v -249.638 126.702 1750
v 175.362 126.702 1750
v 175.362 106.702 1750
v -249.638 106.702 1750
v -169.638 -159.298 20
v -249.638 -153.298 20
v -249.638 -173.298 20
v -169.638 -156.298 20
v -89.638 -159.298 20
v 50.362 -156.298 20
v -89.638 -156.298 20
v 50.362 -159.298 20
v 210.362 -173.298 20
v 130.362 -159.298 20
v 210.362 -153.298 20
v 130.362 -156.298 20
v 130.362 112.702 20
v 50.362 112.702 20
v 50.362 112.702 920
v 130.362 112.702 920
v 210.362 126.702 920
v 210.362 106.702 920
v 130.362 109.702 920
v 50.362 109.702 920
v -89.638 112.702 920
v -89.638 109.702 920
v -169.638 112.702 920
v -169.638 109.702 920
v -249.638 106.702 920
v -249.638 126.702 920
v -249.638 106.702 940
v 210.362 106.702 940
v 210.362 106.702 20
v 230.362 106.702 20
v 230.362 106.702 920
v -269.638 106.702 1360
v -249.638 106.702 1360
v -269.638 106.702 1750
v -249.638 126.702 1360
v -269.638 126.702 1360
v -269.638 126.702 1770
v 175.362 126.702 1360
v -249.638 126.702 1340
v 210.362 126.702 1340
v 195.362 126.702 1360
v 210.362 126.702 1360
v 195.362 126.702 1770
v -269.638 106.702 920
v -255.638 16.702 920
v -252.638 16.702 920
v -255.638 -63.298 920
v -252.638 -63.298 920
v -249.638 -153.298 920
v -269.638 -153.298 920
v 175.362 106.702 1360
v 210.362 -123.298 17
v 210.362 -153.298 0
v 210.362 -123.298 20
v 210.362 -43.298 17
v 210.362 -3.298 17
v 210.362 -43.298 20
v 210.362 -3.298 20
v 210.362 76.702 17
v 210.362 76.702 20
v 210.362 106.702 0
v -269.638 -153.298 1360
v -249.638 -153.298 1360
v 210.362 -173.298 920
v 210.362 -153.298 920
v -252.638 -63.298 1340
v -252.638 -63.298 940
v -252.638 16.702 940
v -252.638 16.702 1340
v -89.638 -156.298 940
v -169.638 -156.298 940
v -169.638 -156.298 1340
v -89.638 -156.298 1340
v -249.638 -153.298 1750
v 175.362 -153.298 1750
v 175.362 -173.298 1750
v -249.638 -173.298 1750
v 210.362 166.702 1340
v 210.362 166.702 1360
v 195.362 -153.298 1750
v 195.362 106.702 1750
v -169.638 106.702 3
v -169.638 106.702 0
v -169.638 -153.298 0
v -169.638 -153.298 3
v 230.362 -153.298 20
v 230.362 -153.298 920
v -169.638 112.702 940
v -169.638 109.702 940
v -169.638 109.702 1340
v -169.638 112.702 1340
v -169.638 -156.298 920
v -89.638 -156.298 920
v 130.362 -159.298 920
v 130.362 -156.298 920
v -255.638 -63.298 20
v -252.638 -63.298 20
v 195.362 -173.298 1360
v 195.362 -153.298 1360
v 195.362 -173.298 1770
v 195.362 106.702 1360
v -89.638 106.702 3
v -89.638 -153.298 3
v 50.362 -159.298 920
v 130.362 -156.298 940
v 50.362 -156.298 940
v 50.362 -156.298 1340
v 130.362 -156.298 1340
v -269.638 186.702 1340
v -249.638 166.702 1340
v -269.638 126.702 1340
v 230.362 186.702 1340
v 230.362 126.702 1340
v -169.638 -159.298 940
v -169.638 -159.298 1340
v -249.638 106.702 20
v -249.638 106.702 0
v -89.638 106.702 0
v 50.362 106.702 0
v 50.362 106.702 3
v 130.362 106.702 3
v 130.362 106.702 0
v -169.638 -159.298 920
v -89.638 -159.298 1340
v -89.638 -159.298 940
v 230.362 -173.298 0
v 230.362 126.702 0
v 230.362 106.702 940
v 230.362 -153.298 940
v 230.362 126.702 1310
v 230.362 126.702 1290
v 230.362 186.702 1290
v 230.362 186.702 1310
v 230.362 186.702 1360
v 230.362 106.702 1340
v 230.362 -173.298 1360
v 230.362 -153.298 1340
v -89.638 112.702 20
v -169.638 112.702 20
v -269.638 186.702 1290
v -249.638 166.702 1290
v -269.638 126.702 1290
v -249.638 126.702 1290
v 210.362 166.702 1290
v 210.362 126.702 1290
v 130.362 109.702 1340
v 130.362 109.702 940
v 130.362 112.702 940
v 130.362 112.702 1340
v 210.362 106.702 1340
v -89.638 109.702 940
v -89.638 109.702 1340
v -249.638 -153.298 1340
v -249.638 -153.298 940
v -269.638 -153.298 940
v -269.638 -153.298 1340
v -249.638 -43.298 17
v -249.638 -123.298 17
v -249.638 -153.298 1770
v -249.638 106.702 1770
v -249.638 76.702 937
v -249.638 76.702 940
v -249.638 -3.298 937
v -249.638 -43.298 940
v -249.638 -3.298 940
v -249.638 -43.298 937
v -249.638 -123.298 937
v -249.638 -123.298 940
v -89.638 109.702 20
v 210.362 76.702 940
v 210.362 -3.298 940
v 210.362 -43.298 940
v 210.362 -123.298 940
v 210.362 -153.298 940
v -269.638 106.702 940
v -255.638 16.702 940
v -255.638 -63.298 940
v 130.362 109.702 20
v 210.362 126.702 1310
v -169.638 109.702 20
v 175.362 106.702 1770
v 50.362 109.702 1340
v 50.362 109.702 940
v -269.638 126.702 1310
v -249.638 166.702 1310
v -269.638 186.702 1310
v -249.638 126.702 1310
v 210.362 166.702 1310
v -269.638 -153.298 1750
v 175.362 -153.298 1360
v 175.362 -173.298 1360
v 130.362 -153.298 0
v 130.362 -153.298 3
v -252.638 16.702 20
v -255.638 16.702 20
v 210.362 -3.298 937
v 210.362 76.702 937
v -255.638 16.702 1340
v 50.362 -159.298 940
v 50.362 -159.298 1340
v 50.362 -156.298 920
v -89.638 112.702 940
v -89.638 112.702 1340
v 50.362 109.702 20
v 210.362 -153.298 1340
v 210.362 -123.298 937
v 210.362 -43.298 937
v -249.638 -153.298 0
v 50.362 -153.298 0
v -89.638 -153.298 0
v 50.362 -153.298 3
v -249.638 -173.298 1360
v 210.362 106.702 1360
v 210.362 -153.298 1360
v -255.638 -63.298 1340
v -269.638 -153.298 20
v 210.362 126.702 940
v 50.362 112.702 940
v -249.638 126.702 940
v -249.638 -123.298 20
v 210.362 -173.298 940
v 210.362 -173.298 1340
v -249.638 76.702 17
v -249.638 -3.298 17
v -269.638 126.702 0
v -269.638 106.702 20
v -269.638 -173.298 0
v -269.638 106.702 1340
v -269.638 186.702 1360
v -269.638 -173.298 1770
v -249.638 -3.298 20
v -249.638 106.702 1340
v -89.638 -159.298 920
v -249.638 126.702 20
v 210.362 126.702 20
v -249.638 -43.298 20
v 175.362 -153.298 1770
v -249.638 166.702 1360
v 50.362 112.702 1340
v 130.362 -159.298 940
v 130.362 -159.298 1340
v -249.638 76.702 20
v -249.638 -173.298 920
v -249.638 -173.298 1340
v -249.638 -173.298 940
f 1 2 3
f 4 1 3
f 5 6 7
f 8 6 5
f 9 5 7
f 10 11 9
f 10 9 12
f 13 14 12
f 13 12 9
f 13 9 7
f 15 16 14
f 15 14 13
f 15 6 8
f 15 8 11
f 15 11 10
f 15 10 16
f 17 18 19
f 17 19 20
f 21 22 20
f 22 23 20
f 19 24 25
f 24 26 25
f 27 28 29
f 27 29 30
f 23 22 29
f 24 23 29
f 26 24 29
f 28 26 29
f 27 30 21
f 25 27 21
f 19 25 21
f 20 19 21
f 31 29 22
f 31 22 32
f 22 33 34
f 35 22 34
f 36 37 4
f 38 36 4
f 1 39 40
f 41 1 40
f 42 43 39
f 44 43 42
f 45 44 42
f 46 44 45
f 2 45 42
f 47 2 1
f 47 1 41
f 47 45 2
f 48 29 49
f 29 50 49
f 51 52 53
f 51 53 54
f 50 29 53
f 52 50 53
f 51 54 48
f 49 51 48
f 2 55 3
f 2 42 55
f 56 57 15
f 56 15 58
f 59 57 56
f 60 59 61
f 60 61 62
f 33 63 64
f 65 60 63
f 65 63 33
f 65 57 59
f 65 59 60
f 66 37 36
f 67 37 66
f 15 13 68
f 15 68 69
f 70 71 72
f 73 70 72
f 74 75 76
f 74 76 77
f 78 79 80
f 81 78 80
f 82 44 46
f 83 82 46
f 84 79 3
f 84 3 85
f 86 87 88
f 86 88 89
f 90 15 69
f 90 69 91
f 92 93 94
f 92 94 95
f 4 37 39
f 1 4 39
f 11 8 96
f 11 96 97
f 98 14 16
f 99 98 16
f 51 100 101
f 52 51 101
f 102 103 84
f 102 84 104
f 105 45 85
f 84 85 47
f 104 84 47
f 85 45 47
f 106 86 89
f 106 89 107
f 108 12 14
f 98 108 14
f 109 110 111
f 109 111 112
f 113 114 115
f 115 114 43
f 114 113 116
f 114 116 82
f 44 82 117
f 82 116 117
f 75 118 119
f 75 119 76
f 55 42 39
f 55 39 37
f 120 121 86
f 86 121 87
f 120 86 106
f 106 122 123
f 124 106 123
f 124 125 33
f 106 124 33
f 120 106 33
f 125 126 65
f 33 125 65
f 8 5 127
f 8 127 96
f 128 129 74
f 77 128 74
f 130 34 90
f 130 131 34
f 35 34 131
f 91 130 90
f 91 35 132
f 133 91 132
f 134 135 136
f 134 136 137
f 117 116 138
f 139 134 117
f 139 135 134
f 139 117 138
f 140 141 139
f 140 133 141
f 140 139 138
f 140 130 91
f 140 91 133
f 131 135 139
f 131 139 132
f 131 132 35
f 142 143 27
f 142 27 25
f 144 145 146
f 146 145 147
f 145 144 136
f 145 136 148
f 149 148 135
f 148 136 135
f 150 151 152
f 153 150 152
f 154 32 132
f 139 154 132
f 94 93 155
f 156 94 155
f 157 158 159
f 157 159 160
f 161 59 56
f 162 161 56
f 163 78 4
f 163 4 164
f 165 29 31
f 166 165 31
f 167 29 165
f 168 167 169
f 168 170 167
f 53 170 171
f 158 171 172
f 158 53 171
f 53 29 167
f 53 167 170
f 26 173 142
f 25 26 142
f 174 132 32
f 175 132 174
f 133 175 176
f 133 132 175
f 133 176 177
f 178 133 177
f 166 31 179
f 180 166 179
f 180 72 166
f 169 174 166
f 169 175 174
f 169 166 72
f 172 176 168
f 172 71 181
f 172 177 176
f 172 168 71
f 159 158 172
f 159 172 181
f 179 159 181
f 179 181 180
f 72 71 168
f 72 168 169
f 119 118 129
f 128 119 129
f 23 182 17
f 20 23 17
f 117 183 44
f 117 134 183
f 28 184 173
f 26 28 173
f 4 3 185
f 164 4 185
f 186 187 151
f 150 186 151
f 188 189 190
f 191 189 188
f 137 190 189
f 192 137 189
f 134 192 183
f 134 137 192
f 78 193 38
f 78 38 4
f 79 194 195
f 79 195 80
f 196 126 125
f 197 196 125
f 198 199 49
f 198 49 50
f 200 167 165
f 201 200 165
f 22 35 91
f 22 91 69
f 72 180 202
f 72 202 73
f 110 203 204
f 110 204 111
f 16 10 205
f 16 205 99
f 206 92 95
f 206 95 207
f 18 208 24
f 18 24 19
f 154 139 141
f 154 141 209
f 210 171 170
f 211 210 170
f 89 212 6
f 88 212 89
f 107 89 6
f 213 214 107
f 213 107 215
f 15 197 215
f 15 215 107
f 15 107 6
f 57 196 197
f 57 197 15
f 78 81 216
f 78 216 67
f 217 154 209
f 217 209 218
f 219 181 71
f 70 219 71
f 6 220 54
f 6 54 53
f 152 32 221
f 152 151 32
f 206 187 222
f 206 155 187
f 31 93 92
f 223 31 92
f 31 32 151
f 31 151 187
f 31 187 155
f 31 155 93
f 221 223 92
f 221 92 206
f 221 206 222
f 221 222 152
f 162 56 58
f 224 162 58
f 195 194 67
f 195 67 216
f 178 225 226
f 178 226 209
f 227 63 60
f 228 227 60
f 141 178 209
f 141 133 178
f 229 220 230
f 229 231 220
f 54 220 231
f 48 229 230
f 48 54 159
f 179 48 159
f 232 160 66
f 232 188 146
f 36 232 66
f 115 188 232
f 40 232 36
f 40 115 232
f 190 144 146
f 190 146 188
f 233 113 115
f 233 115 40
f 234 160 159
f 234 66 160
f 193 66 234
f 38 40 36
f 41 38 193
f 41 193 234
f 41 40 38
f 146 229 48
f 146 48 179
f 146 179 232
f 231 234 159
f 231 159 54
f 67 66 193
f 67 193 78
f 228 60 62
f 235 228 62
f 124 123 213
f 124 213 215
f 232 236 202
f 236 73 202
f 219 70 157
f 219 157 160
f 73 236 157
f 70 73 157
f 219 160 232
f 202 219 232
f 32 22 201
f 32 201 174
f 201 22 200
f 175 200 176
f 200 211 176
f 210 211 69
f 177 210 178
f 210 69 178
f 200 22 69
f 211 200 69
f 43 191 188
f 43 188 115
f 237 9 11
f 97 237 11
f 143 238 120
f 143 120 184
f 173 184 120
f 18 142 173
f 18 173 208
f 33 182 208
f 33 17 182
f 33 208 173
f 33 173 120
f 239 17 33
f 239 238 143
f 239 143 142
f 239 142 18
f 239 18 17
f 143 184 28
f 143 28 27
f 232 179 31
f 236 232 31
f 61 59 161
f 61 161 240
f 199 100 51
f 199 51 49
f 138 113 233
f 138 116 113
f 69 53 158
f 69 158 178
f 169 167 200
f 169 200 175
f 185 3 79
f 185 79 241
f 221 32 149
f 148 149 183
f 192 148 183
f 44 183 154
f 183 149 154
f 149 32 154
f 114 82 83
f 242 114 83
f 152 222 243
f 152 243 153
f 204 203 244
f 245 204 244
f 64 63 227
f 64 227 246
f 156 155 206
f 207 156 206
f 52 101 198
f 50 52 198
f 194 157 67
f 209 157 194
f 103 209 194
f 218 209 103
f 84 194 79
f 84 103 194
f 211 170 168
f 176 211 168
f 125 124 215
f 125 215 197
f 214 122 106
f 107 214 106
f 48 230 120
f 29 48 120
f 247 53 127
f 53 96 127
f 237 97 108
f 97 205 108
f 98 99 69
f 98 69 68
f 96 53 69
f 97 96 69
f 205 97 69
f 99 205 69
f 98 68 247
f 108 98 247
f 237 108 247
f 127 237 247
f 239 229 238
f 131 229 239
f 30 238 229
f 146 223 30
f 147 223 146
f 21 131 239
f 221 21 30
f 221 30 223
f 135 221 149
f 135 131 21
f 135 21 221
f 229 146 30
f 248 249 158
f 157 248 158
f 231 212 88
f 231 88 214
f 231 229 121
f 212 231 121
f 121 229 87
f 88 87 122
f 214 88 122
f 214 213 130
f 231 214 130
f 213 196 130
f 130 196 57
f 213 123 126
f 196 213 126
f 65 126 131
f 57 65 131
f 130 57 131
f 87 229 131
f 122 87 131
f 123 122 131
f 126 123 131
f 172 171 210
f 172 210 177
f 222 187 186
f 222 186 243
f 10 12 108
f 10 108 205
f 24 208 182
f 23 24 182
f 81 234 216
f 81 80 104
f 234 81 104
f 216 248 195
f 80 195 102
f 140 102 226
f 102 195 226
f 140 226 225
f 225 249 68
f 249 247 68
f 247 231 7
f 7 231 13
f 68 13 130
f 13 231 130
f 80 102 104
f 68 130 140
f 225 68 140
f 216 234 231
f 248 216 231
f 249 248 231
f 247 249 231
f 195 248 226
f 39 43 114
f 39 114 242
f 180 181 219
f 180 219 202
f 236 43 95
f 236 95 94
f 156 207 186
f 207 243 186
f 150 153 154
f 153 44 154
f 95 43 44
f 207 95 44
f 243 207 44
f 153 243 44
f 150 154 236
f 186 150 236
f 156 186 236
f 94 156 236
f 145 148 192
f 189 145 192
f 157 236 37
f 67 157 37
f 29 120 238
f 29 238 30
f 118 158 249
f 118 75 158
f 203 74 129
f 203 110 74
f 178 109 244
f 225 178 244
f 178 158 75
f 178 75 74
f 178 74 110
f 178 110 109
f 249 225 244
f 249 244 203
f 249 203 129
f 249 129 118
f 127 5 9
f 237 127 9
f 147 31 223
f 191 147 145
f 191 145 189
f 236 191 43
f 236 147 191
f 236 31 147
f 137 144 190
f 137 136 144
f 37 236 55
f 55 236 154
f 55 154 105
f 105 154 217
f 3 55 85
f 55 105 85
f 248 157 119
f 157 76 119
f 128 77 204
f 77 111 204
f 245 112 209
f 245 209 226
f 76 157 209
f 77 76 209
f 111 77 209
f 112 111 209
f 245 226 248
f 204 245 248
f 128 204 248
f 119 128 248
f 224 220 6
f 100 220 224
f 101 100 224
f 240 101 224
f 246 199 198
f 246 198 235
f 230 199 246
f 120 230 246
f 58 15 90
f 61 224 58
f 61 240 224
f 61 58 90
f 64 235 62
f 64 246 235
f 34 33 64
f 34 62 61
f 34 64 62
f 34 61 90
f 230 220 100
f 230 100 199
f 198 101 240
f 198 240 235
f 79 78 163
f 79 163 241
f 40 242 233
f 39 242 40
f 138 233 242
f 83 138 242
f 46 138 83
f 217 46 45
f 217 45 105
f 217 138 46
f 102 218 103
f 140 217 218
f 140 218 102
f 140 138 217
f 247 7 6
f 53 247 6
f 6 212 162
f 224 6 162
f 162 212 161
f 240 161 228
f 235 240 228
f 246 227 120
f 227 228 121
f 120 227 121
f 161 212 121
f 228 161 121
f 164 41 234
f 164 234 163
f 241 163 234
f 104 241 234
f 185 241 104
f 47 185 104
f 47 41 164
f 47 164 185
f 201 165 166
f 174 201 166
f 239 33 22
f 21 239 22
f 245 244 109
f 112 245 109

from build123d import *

# Parameters (mm, degrees)
F0_W      = 500
F0_H      = 300
F0_W_2    = 460
F0_H_2    = 260
F1_DEPTH  = 20
F2_W      = 80
F2_H      = 3
F3_DEPTH  = 260
F4_W      = 80
F4_H      = 3
F5_DEPTH  = 460
F6_W      = 20
F6_H      = 20
F7_DEPTH  = 1340
F8_W      = 20
F8_H      = 20
F9_DEPTH  = 460
F10_W     = 20
F10_H     = 20
F11_DEPTH = 260
F12_W     = 20
F12_H     = 20
F13_DEPTH = 460
F14_W     = 3
F14_H     = 80
F15_DEPTH = 900
F16_W     = 80
F16_H     = 3
F17_DEPTH = 900
F18_W     = 80
F18_H     = 3
F19_DEPTH = 900
F20_W     = 20
F20_H     = 20
F21_DEPTH = 460
F22_W     = 20
F22_H     = 20
F23_DEPTH = 260
F24_W     = 20
F24_H     = 20
F25_DEPTH = 460
F26_W     = 80
F26_H     = 3
F27_DEPTH = 460
F28_W     = 3
F28_H     = 80
F29_DEPTH = 400
F30_W     = 80
F30_H     = 3
F31_DEPTH = 400
F32_W     = 80
F32_H     = 3
F33_DEPTH = 400
F34_W     = 20
F34_H     = 20
F35_DEPTH = 60
F36_W     = 20
F36_H     = 20
F37_DEPTH = 460
F38_W     = 20
F38_H     = 20
F39_DEPTH = 410
F40_W     = 20
F40_H     = 20
F41_DEPTH = 260
F42_W     = 20
F42_H     = 20
F42_W_2   = 19.9999999999
F43_DEPTH = 425
F44_W     = 20
F44_H     = 20
F45_DEPTH = 260
F46_W     = 20
F46_H     = 20
F47_DEPTH = 460


with BuildPart() as f1:
    # F0 (on Top) → F1 (new body)
    with BuildSketch(Plane.XY):
        with Locations((-19.6381509304, -23.2981824888)):
            Rectangle(F0_W, F0_H)
        with Locations((-19.6381509304, -23.2981824888)):
            Rectangle(F0_W_2, F0_H_2, mode=Mode.SUBTRACT)
    extrude(amount=F1_DEPTH)

    # F2 (on face) → F3 (join, through all)
    with BuildSketch(Plane.XZ.offset(-106.7018175112)):
        with Locations((-129.6381509304, 1.5)):
            Rectangle(F2_W, F2_H)
        with Locations((90.3618490696, 1.5)):
            Rectangle(F2_W, F2_H)
    extrude(amount=F3_DEPTH)

    # F4 (on face) → F5 (join, through all)
    with BuildSketch(Plane(origin=(210.3618490696, 0, 0), x_dir=(0, -1, 0), z_dir=(-1, 0, 0))):
        with Locations((-36.7018175112, 18.5)):
            Rectangle(F4_W, F4_H)
        with Locations((83.2981824888, 18.5)):
            Rectangle(F4_W, F4_H)
    extrude(amount=F5_DEPTH)

    # F6 (on face) → F7 (join)
    with BuildSketch(Plane.XY.offset(20)):
        with Locations((-259.6381509304, 116.7018175112)):
            Rectangle(F6_W, F6_H)
        with Locations((-259.6381509304, -163.2981824888)):
            Rectangle(F6_W, F6_H)
        with Locations((220.3618490696, -163.2981824888)):
            Rectangle(F6_W, F6_H)
        with Locations((220.3618490696, 116.7018175112)):
            Rectangle(F6_W, F6_H)
    extrude(amount=F7_DEPTH)

    # F8 (on face) → F9 (join, through all)
    with BuildSketch(Plane(origin=(210.3618490696, 0, 0), x_dir=(0, -1, 0), z_dir=(-1, 0, 0))):
        with Locations((163.2981824888, 930)):
            Rectangle(F8_W, F8_H)
    extrude(amount=F9_DEPTH)

    # F10 (on face) → F11 (join, through all)
    with BuildSketch(Plane(origin=(0, -153.2981824888, 0), x_dir=(-1, 0, 0), z_dir=(0, 1, 0))):
        with Locations((259.6381509304, 930)):
            Rectangle(F10_W, F10_H)
        with Locations((-220.3618490696, 930)):
            Rectangle(F10_W, F10_H)
    extrude(amount=F11_DEPTH)

    # F12 (on face) → F13 (join, through all)
    with BuildSketch(Plane.YZ.offset(-249.6381509304)):
        with Locations((116.7018175112, 930)):
            Rectangle(F12_W, F12_H)
    extrude(amount=F13_DEPTH)

    # F14 (on face) → F15 (join, through all)
    with BuildSketch(Plane.XY.offset(20)):
        with Locations((-254.1381509304, -23.2981824888)):
            Rectangle(F14_W, F14_H)
    extrude(amount=F15_DEPTH)

    # F16 (on face) → F17 (join, through all)
    with BuildSketch(Plane.XY.offset(20)):
        with Locations((90.3618490696, 111.2018175112)):
            Rectangle(F16_W, F16_H)
        with Locations((-129.6381509304, 111.2018175112)):
            Rectangle(F16_W, F16_H)
    extrude(amount=F17_DEPTH)

    # F18 (on face) → F19 (join, through all)
    with BuildSketch(Plane.XY.offset(20)):
        with Locations((-129.6381509304, -157.7981824888)):
            Rectangle(F18_W, F18_H)
        with Locations((90.3618490696, -157.7981824888)):
            Rectangle(F18_W, F18_H)
    extrude(amount=F19_DEPTH)

    # F20 (on face) → F21 (join, through all)
    with BuildSketch(Plane(origin=(210.3618490696, 0, 0), x_dir=(0, -1, 0), z_dir=(-1, 0, 0))):
        with Locations((163.2981824888, 1350)):
            Rectangle(F20_W, F20_H)
    extrude(amount=F21_DEPTH)

    # F22 (on face) → F23 (join, through all)
    with BuildSketch(Plane(origin=(0, -153.2981824888, 0), x_dir=(-1, 0, 0), z_dir=(0, 1, 0))):
        with Locations((-220.3618490696, 1350)):
            Rectangle(F22_W, F22_H)
        with Locations((259.6381509304, 1350)):
            Rectangle(F22_W, F22_H)
    extrude(amount=F23_DEPTH)

    # F24 (on face) → F25 (join, through all)
    with BuildSketch(Plane(origin=(210.3618490696, 0, 0), x_dir=(0, -1, 0), z_dir=(-1, 0, 0))):
        with Locations((-116.7018175112, 1350)):
            Rectangle(F24_W, F24_H)
    extrude(amount=F25_DEPTH)

    # F26 (on face) → F27 (join, through all)
    with BuildSketch(Plane.YZ.offset(-249.6381509304)):
        with Locations((-83.2981824888, 938.5)):
            Rectangle(F26_W, F26_H)
        with Locations((36.7018175112, 938.5)):
            Rectangle(F26_W, F26_H)
    extrude(amount=F27_DEPTH)

    # F28 (on face) → F29 (join, through all)
    with BuildSketch(Plane.XY.offset(940)):
        with Locations((-254.1381509304, -23.2981824888)):
            Rectangle(F28_W, F28_H)
    extrude(amount=F29_DEPTH)

    # F30 (on face) → F31 (join, through all)
    with BuildSketch(Plane.XY.offset(940)):
        with Locations((90.3618490696, -157.7981824888)):
            Rectangle(F30_W, F30_H)
        with Locations((-129.6381509304, -157.7981824888)):
            Rectangle(F30_W, F30_H)
    extrude(amount=F31_DEPTH)

    # F32 (on face) → F33 (join, through all)
    with BuildSketch(Plane.XY.offset(940)):
        with Locations((90.3618490696, 111.2018175112)):
            Rectangle(F32_W, F32_H)
        with Locations((-129.6381509304, 111.2018175112)):
            Rectangle(F32_W, F32_H)
    extrude(amount=F33_DEPTH)

    # F34 (on face) → F35 (join)
    with BuildSketch(Plane(origin=(0, 126.7018175112, 0), x_dir=(-1, 0, 0), z_dir=(0, 1, 0))):
        with Locations((-220.3618490696, 1350)):
            Rectangle(F34_W, F34_H)
        with Locations((259.6381509304, 1350)):
            Rectangle(F34_W, F34_H)
        with Locations((-220.3618490696, 1300)):
            Rectangle(F34_W, F34_H)
        with Locations((259.6381509304, 1300)):
            Rectangle(F34_W, F34_H)
    extrude(amount=F35_DEPTH)

    # F36 (on face) → F37 (join, through all)
    with BuildSketch(Plane(origin=(210.3618490696, 0, 0), x_dir=(0, -1, 0), z_dir=(-1, 0, 0))):
        with Locations((-176.7018175112, 1350)):
            Rectangle(F36_W, F36_H)
    extrude(amount=F37_DEPTH)

    # F38 (on face) → F39 (join)
    with BuildSketch(Plane.XY.offset(1360)):
        with Locations((-259.6381509304, -163.2981824888)):
            Rectangle(F38_W, F38_H)
        with Locations((-259.6381509304, 116.7018175112)):
            Rectangle(F38_W, F38_H)
        with Locations((185.3618490696, 116.7018175112)):
            Rectangle(F38_W, F38_H)
        with Locations((185.3618490696, -163.2981824888)):
            Rectangle(F38_W, F38_H)
    extrude(amount=F39_DEPTH)

    # F40 (on face) → F41 (join, through all)
    with BuildSketch(Plane.XZ.offset(-106.7018175112)):
        with Locations((185.3618490696, 1760)):
            Rectangle(F40_W, F40_H)
    extrude(amount=F41_DEPTH)

    # F42 (on face) → F43 (join, through all)
    with BuildSketch(Plane(origin=(175.3618490696, 0, 0), x_dir=(0, -1, 0), z_dir=(-1, 0, 0))):
        with Locations((-116.7018175112, 1760)):
            Rectangle(F42_W, F42_H)
        with Locations((163.2981824889, 1760)):
            Rectangle(F42_W_2, F42_H)
    extrude(amount=F43_DEPTH)

    # F44 (on face) → F45 (join, through all)
    with BuildSketch(Plane.XZ.offset(-106.7018175112)):
        with Locations((-259.6381509304, 1760)):
            Rectangle(F44_W, F44_H)
    extrude(amount=F45_DEPTH)

    # F46 (on face) → F47 (join, through all)
    with BuildSketch(Plane(origin=(210.3618490696, 0, 0), x_dir=(0, -1, 0), z_dir=(-1, 0, 0))):
        with Locations((-176.7018175112, 1300)):
            Rectangle(F46_W, F46_H)
    extrude(amount=F47_DEPTH)


solid = f1.part
